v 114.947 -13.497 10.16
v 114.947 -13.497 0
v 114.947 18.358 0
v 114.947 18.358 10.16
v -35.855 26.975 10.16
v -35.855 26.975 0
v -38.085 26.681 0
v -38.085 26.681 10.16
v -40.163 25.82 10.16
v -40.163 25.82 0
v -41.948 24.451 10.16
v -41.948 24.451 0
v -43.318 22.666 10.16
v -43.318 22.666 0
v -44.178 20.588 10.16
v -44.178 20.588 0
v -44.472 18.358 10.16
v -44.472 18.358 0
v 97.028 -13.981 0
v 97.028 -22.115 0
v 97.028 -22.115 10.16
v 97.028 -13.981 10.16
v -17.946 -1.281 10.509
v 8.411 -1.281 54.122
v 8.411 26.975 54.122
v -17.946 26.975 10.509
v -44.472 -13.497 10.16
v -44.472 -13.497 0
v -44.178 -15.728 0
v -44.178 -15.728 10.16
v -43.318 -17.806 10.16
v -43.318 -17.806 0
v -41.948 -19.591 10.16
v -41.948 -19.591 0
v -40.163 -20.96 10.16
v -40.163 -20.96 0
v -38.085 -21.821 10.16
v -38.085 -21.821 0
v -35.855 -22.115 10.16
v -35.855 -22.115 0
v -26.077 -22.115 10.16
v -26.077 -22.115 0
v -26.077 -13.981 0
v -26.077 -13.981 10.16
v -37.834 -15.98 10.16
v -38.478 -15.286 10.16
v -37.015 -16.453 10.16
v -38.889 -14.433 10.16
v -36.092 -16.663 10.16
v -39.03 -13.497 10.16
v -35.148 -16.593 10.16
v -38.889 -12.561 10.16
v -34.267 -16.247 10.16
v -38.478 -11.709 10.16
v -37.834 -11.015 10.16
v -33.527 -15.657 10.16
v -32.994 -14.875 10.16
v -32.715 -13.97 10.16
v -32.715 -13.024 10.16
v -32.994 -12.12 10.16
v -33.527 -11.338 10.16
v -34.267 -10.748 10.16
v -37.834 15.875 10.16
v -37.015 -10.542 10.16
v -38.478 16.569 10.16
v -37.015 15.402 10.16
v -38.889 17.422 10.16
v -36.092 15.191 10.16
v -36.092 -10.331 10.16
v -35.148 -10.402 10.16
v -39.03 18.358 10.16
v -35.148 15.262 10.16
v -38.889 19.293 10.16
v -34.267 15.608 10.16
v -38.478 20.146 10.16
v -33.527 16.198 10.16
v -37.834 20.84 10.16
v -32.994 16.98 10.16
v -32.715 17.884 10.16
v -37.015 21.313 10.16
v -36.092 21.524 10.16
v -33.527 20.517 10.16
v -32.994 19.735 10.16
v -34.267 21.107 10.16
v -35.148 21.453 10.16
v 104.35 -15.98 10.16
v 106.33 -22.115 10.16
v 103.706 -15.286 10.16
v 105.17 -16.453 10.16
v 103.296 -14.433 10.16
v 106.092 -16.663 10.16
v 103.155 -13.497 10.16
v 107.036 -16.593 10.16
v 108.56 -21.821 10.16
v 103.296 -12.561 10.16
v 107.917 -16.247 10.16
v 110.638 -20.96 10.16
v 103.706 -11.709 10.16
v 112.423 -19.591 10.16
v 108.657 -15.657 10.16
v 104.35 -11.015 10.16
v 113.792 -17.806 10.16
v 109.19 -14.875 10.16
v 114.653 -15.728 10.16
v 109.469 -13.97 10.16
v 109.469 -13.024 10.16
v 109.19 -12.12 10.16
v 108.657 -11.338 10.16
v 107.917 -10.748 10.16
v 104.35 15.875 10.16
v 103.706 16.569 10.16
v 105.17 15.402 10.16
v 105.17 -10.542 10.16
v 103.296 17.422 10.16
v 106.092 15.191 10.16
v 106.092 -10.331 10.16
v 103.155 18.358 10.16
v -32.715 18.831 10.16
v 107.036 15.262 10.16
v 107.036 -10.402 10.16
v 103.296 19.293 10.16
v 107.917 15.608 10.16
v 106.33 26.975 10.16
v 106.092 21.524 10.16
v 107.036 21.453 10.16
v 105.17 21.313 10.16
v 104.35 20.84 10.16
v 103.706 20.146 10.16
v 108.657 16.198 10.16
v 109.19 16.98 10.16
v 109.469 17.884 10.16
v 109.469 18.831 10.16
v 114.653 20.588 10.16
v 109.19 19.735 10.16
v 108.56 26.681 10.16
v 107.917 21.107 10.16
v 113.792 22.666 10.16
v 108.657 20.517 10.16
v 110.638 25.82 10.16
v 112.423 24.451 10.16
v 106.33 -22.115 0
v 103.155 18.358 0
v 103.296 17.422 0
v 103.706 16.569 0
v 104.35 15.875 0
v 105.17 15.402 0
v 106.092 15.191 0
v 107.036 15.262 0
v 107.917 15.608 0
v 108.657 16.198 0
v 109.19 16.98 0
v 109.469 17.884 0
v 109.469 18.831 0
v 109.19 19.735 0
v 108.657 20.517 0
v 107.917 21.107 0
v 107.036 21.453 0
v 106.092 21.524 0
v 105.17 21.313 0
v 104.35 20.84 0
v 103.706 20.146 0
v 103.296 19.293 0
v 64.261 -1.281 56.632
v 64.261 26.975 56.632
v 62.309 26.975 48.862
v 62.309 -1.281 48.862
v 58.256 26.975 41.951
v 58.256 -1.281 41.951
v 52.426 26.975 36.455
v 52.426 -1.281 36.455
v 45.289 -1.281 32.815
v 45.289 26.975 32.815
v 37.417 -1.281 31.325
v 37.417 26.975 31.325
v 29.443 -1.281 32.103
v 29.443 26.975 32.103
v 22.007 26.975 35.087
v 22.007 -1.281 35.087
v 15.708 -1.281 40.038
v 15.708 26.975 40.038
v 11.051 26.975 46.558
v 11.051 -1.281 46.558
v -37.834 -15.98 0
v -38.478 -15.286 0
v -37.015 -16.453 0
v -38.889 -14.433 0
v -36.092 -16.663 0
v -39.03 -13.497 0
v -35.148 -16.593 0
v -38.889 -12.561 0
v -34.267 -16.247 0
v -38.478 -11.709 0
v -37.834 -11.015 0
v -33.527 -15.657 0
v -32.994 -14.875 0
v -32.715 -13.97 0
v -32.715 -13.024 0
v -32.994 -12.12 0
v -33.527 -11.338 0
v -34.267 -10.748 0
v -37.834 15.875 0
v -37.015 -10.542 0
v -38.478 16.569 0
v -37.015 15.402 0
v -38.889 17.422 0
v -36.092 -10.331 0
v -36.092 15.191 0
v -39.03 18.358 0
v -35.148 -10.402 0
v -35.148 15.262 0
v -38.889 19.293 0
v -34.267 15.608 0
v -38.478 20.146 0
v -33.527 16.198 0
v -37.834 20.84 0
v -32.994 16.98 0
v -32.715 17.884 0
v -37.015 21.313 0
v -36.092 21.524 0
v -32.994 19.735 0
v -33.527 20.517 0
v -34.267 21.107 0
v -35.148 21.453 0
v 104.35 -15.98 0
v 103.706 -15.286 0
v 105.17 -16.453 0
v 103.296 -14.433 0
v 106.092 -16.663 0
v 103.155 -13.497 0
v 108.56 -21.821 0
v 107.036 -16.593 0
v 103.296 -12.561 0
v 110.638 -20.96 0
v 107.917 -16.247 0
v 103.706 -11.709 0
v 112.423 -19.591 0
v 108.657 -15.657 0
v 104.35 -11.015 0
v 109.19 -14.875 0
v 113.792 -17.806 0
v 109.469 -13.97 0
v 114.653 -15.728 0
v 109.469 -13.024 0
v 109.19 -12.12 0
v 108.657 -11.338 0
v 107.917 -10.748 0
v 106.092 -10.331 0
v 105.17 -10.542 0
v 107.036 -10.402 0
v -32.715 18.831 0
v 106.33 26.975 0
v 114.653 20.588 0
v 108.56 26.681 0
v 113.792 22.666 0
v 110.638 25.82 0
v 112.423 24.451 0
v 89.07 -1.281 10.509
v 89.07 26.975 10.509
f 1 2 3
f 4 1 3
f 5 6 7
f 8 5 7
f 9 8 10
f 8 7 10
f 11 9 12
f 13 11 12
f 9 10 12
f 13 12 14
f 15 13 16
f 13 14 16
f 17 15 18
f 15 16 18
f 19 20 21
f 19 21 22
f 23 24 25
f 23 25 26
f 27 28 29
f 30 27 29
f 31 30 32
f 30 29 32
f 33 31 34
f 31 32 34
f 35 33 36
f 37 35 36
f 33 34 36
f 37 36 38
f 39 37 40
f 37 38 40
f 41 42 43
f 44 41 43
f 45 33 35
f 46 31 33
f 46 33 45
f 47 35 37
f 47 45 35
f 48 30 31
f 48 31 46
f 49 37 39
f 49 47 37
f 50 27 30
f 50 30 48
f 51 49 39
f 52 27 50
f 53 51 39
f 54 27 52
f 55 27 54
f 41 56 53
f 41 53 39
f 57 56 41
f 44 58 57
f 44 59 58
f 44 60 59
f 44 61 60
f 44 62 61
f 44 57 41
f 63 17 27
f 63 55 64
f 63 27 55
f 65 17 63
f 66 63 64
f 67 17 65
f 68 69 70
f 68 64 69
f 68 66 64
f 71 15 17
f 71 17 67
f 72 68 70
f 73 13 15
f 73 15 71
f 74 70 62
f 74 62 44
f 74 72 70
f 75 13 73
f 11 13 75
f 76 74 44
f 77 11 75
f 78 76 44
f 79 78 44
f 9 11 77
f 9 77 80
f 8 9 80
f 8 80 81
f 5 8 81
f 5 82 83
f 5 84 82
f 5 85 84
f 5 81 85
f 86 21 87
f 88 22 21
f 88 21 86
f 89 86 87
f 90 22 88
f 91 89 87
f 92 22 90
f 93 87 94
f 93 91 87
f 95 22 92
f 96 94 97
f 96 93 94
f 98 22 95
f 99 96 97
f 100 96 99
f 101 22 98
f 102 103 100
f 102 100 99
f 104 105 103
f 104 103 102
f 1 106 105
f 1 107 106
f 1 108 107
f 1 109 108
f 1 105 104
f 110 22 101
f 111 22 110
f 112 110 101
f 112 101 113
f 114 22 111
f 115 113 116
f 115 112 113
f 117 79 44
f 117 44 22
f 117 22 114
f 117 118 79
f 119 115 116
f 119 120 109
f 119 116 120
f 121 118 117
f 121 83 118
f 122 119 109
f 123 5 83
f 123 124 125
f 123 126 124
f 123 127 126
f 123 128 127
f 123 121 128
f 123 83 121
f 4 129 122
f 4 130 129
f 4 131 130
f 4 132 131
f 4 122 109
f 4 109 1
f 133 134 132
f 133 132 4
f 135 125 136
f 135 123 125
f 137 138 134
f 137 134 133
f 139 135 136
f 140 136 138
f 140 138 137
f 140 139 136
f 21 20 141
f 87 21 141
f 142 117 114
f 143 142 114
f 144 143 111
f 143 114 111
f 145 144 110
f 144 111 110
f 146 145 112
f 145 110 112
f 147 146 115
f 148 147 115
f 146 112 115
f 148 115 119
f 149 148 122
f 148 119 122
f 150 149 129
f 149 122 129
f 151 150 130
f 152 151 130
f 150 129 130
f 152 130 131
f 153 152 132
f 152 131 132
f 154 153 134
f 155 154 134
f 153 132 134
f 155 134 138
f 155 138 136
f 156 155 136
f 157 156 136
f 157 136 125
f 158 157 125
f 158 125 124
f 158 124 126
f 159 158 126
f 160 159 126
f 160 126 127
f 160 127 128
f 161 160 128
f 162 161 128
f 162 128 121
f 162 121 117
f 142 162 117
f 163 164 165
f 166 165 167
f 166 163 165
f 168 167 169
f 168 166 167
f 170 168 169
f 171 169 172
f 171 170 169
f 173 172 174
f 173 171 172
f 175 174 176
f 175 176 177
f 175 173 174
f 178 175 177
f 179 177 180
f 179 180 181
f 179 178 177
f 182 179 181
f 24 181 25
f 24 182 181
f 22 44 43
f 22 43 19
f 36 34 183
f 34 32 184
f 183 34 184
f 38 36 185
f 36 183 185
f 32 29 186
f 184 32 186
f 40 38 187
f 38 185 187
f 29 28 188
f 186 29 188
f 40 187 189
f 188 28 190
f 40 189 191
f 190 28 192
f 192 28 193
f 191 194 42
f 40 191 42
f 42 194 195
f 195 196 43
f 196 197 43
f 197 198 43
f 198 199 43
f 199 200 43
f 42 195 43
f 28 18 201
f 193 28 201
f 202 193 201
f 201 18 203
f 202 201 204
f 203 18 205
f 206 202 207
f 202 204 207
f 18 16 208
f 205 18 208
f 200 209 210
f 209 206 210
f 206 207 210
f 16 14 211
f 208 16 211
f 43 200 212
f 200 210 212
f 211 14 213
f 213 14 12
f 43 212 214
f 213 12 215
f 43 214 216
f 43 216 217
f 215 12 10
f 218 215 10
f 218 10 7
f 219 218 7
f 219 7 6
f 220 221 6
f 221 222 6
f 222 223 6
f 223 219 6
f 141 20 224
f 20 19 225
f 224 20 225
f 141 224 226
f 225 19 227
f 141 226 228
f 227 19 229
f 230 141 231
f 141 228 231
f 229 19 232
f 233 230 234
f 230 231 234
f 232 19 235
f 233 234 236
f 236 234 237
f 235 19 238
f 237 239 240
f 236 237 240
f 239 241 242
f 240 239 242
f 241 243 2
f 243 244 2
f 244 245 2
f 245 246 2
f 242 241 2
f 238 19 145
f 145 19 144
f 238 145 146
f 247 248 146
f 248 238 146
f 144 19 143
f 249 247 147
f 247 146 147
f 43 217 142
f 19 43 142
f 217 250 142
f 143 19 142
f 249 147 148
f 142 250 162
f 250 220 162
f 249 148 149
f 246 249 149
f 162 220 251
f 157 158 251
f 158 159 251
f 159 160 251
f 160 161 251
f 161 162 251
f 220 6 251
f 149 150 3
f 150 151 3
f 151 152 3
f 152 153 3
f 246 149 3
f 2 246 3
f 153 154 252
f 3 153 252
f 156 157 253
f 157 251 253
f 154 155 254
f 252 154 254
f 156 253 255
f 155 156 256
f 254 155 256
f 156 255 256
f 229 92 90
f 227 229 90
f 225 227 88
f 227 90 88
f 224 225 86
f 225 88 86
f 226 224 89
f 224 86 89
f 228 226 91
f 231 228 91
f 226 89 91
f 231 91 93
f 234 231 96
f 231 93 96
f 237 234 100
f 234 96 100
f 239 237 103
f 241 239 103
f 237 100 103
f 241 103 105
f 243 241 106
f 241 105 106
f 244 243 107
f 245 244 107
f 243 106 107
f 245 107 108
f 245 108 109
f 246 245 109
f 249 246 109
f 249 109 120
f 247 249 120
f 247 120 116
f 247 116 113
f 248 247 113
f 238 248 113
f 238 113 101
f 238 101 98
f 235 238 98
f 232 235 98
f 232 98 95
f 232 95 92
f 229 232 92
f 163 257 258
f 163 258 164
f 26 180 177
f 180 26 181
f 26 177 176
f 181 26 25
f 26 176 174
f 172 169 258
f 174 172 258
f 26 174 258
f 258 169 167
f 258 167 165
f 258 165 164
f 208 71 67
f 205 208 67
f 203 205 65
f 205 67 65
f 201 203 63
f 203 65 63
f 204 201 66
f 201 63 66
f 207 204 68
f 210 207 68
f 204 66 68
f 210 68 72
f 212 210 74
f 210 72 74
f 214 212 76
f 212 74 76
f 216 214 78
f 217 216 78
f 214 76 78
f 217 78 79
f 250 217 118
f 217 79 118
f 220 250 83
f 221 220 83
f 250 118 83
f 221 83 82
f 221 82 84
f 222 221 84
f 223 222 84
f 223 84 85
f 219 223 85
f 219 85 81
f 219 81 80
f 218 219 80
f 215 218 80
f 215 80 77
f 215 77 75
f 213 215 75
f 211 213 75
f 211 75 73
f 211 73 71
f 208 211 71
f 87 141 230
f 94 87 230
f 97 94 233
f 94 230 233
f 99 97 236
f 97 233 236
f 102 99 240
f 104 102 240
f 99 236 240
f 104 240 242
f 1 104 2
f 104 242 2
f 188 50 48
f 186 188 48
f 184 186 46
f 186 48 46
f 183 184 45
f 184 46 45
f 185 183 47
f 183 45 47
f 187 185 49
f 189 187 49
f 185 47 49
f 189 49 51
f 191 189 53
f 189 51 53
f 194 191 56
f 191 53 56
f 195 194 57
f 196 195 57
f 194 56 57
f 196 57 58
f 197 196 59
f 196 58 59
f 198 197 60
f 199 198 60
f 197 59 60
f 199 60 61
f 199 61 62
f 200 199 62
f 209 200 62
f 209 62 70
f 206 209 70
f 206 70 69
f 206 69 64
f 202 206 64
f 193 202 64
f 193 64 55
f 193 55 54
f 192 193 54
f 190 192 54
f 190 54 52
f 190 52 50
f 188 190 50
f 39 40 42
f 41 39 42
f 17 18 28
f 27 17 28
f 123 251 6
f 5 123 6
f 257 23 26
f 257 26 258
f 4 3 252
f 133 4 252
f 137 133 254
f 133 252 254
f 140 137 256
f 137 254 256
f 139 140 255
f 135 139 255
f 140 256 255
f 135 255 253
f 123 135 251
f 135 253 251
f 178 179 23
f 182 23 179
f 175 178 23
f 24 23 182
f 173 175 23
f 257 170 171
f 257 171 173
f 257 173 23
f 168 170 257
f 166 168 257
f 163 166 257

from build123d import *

# Parameters (mm, degrees)
F2_DEPTH = 10.16
F3_W     = 123.1050416827
F3_H     = 28.3880503848
F4_DEPTH = 10.161
F5_D     = 6.35
F8_DEPTH = 28.2554122016


with BuildPart() as f2:
    # F1 (on face) → F2 (new body)
    with BuildSketch(Plane.XY):
        with BuildLine():
            ThreePointArc((114.94692415, 18.357520923), (112.4229648917, 24.4508975952), (106.3295882195, 26.9748568535))
            Line((106.3295882195, 26.9748568535), (-35.8547288924, 26.9748568535))
            ThreePointArc((-35.8547288924, 26.9748568535), (-41.9481055646, 24.4508975952), (-44.4720648229, 18.357520923))
            Line((-44.4720648229, 18.357520923), (-44.4720648229, -13.49719055))
            ThreePointArc((-44.4720648229, -13.49719055), (-41.9481055646, -19.5905672222), (-35.8547288924, -22.1145264804))
            Line((-35.8547288924, -22.1145264804), (106.3295882195, -22.1145264804))
            ThreePointArc((106.3295882195, -22.1145264804), (112.4229648917, -19.5905672222), (114.94692415, -13.49719055))
            Line((114.94692415, -13.49719055), (114.94692415, 18.357520923))
        make_face()
    extrude(amount=F2_DEPTH)

    # F3 (on face) → F4 (cut, through all)
    with BuildSketch(Plane.XY.offset(10.16)):
        with Locations((35.4754142463, -28.1745805405)):
            Rectangle(F3_W, F3_H)
    extrude(amount=-F4_DEPTH, mode=Mode.SUBTRACT)

    # F5 (through all)
    with Locations(Plane(origin=(0, 0, 0), x_dir=(1, 0, 0), z_dir=(0, 0, -1))):
        with Locations((106.3295882195, -18.357520923), (106.3295882195, 13.49719055), (-35.8547288924, 13.49719055), (-35.8547288924, -18.357520923)):
            Hole(F5_D / 2)


with BuildPart() as f8:
    # F7 (on offset) → F8 (new body, through all)
    with BuildSketch(Plane.XZ.offset(1.2805553481)):
        with BuildLine():
            Line((8.4105487913, 54.1223697364), (-17.9456844926, 10.5090765283))
            Line((-17.9456844926, 10.5090765283), (89.0695827941, 10.5090765283))
            Line((89.0695827941, 10.5090765283), (64.2606690526, 56.632488966))
            ThreePointArc((64.2606690526, 56.632488966), (37.4166388516, 31.3245274547), (8.4105487913, 54.1223697364))
        make_face()
    extrude(amount=-F8_DEPTH)


solid = Compound([f2.part, f8.part])
